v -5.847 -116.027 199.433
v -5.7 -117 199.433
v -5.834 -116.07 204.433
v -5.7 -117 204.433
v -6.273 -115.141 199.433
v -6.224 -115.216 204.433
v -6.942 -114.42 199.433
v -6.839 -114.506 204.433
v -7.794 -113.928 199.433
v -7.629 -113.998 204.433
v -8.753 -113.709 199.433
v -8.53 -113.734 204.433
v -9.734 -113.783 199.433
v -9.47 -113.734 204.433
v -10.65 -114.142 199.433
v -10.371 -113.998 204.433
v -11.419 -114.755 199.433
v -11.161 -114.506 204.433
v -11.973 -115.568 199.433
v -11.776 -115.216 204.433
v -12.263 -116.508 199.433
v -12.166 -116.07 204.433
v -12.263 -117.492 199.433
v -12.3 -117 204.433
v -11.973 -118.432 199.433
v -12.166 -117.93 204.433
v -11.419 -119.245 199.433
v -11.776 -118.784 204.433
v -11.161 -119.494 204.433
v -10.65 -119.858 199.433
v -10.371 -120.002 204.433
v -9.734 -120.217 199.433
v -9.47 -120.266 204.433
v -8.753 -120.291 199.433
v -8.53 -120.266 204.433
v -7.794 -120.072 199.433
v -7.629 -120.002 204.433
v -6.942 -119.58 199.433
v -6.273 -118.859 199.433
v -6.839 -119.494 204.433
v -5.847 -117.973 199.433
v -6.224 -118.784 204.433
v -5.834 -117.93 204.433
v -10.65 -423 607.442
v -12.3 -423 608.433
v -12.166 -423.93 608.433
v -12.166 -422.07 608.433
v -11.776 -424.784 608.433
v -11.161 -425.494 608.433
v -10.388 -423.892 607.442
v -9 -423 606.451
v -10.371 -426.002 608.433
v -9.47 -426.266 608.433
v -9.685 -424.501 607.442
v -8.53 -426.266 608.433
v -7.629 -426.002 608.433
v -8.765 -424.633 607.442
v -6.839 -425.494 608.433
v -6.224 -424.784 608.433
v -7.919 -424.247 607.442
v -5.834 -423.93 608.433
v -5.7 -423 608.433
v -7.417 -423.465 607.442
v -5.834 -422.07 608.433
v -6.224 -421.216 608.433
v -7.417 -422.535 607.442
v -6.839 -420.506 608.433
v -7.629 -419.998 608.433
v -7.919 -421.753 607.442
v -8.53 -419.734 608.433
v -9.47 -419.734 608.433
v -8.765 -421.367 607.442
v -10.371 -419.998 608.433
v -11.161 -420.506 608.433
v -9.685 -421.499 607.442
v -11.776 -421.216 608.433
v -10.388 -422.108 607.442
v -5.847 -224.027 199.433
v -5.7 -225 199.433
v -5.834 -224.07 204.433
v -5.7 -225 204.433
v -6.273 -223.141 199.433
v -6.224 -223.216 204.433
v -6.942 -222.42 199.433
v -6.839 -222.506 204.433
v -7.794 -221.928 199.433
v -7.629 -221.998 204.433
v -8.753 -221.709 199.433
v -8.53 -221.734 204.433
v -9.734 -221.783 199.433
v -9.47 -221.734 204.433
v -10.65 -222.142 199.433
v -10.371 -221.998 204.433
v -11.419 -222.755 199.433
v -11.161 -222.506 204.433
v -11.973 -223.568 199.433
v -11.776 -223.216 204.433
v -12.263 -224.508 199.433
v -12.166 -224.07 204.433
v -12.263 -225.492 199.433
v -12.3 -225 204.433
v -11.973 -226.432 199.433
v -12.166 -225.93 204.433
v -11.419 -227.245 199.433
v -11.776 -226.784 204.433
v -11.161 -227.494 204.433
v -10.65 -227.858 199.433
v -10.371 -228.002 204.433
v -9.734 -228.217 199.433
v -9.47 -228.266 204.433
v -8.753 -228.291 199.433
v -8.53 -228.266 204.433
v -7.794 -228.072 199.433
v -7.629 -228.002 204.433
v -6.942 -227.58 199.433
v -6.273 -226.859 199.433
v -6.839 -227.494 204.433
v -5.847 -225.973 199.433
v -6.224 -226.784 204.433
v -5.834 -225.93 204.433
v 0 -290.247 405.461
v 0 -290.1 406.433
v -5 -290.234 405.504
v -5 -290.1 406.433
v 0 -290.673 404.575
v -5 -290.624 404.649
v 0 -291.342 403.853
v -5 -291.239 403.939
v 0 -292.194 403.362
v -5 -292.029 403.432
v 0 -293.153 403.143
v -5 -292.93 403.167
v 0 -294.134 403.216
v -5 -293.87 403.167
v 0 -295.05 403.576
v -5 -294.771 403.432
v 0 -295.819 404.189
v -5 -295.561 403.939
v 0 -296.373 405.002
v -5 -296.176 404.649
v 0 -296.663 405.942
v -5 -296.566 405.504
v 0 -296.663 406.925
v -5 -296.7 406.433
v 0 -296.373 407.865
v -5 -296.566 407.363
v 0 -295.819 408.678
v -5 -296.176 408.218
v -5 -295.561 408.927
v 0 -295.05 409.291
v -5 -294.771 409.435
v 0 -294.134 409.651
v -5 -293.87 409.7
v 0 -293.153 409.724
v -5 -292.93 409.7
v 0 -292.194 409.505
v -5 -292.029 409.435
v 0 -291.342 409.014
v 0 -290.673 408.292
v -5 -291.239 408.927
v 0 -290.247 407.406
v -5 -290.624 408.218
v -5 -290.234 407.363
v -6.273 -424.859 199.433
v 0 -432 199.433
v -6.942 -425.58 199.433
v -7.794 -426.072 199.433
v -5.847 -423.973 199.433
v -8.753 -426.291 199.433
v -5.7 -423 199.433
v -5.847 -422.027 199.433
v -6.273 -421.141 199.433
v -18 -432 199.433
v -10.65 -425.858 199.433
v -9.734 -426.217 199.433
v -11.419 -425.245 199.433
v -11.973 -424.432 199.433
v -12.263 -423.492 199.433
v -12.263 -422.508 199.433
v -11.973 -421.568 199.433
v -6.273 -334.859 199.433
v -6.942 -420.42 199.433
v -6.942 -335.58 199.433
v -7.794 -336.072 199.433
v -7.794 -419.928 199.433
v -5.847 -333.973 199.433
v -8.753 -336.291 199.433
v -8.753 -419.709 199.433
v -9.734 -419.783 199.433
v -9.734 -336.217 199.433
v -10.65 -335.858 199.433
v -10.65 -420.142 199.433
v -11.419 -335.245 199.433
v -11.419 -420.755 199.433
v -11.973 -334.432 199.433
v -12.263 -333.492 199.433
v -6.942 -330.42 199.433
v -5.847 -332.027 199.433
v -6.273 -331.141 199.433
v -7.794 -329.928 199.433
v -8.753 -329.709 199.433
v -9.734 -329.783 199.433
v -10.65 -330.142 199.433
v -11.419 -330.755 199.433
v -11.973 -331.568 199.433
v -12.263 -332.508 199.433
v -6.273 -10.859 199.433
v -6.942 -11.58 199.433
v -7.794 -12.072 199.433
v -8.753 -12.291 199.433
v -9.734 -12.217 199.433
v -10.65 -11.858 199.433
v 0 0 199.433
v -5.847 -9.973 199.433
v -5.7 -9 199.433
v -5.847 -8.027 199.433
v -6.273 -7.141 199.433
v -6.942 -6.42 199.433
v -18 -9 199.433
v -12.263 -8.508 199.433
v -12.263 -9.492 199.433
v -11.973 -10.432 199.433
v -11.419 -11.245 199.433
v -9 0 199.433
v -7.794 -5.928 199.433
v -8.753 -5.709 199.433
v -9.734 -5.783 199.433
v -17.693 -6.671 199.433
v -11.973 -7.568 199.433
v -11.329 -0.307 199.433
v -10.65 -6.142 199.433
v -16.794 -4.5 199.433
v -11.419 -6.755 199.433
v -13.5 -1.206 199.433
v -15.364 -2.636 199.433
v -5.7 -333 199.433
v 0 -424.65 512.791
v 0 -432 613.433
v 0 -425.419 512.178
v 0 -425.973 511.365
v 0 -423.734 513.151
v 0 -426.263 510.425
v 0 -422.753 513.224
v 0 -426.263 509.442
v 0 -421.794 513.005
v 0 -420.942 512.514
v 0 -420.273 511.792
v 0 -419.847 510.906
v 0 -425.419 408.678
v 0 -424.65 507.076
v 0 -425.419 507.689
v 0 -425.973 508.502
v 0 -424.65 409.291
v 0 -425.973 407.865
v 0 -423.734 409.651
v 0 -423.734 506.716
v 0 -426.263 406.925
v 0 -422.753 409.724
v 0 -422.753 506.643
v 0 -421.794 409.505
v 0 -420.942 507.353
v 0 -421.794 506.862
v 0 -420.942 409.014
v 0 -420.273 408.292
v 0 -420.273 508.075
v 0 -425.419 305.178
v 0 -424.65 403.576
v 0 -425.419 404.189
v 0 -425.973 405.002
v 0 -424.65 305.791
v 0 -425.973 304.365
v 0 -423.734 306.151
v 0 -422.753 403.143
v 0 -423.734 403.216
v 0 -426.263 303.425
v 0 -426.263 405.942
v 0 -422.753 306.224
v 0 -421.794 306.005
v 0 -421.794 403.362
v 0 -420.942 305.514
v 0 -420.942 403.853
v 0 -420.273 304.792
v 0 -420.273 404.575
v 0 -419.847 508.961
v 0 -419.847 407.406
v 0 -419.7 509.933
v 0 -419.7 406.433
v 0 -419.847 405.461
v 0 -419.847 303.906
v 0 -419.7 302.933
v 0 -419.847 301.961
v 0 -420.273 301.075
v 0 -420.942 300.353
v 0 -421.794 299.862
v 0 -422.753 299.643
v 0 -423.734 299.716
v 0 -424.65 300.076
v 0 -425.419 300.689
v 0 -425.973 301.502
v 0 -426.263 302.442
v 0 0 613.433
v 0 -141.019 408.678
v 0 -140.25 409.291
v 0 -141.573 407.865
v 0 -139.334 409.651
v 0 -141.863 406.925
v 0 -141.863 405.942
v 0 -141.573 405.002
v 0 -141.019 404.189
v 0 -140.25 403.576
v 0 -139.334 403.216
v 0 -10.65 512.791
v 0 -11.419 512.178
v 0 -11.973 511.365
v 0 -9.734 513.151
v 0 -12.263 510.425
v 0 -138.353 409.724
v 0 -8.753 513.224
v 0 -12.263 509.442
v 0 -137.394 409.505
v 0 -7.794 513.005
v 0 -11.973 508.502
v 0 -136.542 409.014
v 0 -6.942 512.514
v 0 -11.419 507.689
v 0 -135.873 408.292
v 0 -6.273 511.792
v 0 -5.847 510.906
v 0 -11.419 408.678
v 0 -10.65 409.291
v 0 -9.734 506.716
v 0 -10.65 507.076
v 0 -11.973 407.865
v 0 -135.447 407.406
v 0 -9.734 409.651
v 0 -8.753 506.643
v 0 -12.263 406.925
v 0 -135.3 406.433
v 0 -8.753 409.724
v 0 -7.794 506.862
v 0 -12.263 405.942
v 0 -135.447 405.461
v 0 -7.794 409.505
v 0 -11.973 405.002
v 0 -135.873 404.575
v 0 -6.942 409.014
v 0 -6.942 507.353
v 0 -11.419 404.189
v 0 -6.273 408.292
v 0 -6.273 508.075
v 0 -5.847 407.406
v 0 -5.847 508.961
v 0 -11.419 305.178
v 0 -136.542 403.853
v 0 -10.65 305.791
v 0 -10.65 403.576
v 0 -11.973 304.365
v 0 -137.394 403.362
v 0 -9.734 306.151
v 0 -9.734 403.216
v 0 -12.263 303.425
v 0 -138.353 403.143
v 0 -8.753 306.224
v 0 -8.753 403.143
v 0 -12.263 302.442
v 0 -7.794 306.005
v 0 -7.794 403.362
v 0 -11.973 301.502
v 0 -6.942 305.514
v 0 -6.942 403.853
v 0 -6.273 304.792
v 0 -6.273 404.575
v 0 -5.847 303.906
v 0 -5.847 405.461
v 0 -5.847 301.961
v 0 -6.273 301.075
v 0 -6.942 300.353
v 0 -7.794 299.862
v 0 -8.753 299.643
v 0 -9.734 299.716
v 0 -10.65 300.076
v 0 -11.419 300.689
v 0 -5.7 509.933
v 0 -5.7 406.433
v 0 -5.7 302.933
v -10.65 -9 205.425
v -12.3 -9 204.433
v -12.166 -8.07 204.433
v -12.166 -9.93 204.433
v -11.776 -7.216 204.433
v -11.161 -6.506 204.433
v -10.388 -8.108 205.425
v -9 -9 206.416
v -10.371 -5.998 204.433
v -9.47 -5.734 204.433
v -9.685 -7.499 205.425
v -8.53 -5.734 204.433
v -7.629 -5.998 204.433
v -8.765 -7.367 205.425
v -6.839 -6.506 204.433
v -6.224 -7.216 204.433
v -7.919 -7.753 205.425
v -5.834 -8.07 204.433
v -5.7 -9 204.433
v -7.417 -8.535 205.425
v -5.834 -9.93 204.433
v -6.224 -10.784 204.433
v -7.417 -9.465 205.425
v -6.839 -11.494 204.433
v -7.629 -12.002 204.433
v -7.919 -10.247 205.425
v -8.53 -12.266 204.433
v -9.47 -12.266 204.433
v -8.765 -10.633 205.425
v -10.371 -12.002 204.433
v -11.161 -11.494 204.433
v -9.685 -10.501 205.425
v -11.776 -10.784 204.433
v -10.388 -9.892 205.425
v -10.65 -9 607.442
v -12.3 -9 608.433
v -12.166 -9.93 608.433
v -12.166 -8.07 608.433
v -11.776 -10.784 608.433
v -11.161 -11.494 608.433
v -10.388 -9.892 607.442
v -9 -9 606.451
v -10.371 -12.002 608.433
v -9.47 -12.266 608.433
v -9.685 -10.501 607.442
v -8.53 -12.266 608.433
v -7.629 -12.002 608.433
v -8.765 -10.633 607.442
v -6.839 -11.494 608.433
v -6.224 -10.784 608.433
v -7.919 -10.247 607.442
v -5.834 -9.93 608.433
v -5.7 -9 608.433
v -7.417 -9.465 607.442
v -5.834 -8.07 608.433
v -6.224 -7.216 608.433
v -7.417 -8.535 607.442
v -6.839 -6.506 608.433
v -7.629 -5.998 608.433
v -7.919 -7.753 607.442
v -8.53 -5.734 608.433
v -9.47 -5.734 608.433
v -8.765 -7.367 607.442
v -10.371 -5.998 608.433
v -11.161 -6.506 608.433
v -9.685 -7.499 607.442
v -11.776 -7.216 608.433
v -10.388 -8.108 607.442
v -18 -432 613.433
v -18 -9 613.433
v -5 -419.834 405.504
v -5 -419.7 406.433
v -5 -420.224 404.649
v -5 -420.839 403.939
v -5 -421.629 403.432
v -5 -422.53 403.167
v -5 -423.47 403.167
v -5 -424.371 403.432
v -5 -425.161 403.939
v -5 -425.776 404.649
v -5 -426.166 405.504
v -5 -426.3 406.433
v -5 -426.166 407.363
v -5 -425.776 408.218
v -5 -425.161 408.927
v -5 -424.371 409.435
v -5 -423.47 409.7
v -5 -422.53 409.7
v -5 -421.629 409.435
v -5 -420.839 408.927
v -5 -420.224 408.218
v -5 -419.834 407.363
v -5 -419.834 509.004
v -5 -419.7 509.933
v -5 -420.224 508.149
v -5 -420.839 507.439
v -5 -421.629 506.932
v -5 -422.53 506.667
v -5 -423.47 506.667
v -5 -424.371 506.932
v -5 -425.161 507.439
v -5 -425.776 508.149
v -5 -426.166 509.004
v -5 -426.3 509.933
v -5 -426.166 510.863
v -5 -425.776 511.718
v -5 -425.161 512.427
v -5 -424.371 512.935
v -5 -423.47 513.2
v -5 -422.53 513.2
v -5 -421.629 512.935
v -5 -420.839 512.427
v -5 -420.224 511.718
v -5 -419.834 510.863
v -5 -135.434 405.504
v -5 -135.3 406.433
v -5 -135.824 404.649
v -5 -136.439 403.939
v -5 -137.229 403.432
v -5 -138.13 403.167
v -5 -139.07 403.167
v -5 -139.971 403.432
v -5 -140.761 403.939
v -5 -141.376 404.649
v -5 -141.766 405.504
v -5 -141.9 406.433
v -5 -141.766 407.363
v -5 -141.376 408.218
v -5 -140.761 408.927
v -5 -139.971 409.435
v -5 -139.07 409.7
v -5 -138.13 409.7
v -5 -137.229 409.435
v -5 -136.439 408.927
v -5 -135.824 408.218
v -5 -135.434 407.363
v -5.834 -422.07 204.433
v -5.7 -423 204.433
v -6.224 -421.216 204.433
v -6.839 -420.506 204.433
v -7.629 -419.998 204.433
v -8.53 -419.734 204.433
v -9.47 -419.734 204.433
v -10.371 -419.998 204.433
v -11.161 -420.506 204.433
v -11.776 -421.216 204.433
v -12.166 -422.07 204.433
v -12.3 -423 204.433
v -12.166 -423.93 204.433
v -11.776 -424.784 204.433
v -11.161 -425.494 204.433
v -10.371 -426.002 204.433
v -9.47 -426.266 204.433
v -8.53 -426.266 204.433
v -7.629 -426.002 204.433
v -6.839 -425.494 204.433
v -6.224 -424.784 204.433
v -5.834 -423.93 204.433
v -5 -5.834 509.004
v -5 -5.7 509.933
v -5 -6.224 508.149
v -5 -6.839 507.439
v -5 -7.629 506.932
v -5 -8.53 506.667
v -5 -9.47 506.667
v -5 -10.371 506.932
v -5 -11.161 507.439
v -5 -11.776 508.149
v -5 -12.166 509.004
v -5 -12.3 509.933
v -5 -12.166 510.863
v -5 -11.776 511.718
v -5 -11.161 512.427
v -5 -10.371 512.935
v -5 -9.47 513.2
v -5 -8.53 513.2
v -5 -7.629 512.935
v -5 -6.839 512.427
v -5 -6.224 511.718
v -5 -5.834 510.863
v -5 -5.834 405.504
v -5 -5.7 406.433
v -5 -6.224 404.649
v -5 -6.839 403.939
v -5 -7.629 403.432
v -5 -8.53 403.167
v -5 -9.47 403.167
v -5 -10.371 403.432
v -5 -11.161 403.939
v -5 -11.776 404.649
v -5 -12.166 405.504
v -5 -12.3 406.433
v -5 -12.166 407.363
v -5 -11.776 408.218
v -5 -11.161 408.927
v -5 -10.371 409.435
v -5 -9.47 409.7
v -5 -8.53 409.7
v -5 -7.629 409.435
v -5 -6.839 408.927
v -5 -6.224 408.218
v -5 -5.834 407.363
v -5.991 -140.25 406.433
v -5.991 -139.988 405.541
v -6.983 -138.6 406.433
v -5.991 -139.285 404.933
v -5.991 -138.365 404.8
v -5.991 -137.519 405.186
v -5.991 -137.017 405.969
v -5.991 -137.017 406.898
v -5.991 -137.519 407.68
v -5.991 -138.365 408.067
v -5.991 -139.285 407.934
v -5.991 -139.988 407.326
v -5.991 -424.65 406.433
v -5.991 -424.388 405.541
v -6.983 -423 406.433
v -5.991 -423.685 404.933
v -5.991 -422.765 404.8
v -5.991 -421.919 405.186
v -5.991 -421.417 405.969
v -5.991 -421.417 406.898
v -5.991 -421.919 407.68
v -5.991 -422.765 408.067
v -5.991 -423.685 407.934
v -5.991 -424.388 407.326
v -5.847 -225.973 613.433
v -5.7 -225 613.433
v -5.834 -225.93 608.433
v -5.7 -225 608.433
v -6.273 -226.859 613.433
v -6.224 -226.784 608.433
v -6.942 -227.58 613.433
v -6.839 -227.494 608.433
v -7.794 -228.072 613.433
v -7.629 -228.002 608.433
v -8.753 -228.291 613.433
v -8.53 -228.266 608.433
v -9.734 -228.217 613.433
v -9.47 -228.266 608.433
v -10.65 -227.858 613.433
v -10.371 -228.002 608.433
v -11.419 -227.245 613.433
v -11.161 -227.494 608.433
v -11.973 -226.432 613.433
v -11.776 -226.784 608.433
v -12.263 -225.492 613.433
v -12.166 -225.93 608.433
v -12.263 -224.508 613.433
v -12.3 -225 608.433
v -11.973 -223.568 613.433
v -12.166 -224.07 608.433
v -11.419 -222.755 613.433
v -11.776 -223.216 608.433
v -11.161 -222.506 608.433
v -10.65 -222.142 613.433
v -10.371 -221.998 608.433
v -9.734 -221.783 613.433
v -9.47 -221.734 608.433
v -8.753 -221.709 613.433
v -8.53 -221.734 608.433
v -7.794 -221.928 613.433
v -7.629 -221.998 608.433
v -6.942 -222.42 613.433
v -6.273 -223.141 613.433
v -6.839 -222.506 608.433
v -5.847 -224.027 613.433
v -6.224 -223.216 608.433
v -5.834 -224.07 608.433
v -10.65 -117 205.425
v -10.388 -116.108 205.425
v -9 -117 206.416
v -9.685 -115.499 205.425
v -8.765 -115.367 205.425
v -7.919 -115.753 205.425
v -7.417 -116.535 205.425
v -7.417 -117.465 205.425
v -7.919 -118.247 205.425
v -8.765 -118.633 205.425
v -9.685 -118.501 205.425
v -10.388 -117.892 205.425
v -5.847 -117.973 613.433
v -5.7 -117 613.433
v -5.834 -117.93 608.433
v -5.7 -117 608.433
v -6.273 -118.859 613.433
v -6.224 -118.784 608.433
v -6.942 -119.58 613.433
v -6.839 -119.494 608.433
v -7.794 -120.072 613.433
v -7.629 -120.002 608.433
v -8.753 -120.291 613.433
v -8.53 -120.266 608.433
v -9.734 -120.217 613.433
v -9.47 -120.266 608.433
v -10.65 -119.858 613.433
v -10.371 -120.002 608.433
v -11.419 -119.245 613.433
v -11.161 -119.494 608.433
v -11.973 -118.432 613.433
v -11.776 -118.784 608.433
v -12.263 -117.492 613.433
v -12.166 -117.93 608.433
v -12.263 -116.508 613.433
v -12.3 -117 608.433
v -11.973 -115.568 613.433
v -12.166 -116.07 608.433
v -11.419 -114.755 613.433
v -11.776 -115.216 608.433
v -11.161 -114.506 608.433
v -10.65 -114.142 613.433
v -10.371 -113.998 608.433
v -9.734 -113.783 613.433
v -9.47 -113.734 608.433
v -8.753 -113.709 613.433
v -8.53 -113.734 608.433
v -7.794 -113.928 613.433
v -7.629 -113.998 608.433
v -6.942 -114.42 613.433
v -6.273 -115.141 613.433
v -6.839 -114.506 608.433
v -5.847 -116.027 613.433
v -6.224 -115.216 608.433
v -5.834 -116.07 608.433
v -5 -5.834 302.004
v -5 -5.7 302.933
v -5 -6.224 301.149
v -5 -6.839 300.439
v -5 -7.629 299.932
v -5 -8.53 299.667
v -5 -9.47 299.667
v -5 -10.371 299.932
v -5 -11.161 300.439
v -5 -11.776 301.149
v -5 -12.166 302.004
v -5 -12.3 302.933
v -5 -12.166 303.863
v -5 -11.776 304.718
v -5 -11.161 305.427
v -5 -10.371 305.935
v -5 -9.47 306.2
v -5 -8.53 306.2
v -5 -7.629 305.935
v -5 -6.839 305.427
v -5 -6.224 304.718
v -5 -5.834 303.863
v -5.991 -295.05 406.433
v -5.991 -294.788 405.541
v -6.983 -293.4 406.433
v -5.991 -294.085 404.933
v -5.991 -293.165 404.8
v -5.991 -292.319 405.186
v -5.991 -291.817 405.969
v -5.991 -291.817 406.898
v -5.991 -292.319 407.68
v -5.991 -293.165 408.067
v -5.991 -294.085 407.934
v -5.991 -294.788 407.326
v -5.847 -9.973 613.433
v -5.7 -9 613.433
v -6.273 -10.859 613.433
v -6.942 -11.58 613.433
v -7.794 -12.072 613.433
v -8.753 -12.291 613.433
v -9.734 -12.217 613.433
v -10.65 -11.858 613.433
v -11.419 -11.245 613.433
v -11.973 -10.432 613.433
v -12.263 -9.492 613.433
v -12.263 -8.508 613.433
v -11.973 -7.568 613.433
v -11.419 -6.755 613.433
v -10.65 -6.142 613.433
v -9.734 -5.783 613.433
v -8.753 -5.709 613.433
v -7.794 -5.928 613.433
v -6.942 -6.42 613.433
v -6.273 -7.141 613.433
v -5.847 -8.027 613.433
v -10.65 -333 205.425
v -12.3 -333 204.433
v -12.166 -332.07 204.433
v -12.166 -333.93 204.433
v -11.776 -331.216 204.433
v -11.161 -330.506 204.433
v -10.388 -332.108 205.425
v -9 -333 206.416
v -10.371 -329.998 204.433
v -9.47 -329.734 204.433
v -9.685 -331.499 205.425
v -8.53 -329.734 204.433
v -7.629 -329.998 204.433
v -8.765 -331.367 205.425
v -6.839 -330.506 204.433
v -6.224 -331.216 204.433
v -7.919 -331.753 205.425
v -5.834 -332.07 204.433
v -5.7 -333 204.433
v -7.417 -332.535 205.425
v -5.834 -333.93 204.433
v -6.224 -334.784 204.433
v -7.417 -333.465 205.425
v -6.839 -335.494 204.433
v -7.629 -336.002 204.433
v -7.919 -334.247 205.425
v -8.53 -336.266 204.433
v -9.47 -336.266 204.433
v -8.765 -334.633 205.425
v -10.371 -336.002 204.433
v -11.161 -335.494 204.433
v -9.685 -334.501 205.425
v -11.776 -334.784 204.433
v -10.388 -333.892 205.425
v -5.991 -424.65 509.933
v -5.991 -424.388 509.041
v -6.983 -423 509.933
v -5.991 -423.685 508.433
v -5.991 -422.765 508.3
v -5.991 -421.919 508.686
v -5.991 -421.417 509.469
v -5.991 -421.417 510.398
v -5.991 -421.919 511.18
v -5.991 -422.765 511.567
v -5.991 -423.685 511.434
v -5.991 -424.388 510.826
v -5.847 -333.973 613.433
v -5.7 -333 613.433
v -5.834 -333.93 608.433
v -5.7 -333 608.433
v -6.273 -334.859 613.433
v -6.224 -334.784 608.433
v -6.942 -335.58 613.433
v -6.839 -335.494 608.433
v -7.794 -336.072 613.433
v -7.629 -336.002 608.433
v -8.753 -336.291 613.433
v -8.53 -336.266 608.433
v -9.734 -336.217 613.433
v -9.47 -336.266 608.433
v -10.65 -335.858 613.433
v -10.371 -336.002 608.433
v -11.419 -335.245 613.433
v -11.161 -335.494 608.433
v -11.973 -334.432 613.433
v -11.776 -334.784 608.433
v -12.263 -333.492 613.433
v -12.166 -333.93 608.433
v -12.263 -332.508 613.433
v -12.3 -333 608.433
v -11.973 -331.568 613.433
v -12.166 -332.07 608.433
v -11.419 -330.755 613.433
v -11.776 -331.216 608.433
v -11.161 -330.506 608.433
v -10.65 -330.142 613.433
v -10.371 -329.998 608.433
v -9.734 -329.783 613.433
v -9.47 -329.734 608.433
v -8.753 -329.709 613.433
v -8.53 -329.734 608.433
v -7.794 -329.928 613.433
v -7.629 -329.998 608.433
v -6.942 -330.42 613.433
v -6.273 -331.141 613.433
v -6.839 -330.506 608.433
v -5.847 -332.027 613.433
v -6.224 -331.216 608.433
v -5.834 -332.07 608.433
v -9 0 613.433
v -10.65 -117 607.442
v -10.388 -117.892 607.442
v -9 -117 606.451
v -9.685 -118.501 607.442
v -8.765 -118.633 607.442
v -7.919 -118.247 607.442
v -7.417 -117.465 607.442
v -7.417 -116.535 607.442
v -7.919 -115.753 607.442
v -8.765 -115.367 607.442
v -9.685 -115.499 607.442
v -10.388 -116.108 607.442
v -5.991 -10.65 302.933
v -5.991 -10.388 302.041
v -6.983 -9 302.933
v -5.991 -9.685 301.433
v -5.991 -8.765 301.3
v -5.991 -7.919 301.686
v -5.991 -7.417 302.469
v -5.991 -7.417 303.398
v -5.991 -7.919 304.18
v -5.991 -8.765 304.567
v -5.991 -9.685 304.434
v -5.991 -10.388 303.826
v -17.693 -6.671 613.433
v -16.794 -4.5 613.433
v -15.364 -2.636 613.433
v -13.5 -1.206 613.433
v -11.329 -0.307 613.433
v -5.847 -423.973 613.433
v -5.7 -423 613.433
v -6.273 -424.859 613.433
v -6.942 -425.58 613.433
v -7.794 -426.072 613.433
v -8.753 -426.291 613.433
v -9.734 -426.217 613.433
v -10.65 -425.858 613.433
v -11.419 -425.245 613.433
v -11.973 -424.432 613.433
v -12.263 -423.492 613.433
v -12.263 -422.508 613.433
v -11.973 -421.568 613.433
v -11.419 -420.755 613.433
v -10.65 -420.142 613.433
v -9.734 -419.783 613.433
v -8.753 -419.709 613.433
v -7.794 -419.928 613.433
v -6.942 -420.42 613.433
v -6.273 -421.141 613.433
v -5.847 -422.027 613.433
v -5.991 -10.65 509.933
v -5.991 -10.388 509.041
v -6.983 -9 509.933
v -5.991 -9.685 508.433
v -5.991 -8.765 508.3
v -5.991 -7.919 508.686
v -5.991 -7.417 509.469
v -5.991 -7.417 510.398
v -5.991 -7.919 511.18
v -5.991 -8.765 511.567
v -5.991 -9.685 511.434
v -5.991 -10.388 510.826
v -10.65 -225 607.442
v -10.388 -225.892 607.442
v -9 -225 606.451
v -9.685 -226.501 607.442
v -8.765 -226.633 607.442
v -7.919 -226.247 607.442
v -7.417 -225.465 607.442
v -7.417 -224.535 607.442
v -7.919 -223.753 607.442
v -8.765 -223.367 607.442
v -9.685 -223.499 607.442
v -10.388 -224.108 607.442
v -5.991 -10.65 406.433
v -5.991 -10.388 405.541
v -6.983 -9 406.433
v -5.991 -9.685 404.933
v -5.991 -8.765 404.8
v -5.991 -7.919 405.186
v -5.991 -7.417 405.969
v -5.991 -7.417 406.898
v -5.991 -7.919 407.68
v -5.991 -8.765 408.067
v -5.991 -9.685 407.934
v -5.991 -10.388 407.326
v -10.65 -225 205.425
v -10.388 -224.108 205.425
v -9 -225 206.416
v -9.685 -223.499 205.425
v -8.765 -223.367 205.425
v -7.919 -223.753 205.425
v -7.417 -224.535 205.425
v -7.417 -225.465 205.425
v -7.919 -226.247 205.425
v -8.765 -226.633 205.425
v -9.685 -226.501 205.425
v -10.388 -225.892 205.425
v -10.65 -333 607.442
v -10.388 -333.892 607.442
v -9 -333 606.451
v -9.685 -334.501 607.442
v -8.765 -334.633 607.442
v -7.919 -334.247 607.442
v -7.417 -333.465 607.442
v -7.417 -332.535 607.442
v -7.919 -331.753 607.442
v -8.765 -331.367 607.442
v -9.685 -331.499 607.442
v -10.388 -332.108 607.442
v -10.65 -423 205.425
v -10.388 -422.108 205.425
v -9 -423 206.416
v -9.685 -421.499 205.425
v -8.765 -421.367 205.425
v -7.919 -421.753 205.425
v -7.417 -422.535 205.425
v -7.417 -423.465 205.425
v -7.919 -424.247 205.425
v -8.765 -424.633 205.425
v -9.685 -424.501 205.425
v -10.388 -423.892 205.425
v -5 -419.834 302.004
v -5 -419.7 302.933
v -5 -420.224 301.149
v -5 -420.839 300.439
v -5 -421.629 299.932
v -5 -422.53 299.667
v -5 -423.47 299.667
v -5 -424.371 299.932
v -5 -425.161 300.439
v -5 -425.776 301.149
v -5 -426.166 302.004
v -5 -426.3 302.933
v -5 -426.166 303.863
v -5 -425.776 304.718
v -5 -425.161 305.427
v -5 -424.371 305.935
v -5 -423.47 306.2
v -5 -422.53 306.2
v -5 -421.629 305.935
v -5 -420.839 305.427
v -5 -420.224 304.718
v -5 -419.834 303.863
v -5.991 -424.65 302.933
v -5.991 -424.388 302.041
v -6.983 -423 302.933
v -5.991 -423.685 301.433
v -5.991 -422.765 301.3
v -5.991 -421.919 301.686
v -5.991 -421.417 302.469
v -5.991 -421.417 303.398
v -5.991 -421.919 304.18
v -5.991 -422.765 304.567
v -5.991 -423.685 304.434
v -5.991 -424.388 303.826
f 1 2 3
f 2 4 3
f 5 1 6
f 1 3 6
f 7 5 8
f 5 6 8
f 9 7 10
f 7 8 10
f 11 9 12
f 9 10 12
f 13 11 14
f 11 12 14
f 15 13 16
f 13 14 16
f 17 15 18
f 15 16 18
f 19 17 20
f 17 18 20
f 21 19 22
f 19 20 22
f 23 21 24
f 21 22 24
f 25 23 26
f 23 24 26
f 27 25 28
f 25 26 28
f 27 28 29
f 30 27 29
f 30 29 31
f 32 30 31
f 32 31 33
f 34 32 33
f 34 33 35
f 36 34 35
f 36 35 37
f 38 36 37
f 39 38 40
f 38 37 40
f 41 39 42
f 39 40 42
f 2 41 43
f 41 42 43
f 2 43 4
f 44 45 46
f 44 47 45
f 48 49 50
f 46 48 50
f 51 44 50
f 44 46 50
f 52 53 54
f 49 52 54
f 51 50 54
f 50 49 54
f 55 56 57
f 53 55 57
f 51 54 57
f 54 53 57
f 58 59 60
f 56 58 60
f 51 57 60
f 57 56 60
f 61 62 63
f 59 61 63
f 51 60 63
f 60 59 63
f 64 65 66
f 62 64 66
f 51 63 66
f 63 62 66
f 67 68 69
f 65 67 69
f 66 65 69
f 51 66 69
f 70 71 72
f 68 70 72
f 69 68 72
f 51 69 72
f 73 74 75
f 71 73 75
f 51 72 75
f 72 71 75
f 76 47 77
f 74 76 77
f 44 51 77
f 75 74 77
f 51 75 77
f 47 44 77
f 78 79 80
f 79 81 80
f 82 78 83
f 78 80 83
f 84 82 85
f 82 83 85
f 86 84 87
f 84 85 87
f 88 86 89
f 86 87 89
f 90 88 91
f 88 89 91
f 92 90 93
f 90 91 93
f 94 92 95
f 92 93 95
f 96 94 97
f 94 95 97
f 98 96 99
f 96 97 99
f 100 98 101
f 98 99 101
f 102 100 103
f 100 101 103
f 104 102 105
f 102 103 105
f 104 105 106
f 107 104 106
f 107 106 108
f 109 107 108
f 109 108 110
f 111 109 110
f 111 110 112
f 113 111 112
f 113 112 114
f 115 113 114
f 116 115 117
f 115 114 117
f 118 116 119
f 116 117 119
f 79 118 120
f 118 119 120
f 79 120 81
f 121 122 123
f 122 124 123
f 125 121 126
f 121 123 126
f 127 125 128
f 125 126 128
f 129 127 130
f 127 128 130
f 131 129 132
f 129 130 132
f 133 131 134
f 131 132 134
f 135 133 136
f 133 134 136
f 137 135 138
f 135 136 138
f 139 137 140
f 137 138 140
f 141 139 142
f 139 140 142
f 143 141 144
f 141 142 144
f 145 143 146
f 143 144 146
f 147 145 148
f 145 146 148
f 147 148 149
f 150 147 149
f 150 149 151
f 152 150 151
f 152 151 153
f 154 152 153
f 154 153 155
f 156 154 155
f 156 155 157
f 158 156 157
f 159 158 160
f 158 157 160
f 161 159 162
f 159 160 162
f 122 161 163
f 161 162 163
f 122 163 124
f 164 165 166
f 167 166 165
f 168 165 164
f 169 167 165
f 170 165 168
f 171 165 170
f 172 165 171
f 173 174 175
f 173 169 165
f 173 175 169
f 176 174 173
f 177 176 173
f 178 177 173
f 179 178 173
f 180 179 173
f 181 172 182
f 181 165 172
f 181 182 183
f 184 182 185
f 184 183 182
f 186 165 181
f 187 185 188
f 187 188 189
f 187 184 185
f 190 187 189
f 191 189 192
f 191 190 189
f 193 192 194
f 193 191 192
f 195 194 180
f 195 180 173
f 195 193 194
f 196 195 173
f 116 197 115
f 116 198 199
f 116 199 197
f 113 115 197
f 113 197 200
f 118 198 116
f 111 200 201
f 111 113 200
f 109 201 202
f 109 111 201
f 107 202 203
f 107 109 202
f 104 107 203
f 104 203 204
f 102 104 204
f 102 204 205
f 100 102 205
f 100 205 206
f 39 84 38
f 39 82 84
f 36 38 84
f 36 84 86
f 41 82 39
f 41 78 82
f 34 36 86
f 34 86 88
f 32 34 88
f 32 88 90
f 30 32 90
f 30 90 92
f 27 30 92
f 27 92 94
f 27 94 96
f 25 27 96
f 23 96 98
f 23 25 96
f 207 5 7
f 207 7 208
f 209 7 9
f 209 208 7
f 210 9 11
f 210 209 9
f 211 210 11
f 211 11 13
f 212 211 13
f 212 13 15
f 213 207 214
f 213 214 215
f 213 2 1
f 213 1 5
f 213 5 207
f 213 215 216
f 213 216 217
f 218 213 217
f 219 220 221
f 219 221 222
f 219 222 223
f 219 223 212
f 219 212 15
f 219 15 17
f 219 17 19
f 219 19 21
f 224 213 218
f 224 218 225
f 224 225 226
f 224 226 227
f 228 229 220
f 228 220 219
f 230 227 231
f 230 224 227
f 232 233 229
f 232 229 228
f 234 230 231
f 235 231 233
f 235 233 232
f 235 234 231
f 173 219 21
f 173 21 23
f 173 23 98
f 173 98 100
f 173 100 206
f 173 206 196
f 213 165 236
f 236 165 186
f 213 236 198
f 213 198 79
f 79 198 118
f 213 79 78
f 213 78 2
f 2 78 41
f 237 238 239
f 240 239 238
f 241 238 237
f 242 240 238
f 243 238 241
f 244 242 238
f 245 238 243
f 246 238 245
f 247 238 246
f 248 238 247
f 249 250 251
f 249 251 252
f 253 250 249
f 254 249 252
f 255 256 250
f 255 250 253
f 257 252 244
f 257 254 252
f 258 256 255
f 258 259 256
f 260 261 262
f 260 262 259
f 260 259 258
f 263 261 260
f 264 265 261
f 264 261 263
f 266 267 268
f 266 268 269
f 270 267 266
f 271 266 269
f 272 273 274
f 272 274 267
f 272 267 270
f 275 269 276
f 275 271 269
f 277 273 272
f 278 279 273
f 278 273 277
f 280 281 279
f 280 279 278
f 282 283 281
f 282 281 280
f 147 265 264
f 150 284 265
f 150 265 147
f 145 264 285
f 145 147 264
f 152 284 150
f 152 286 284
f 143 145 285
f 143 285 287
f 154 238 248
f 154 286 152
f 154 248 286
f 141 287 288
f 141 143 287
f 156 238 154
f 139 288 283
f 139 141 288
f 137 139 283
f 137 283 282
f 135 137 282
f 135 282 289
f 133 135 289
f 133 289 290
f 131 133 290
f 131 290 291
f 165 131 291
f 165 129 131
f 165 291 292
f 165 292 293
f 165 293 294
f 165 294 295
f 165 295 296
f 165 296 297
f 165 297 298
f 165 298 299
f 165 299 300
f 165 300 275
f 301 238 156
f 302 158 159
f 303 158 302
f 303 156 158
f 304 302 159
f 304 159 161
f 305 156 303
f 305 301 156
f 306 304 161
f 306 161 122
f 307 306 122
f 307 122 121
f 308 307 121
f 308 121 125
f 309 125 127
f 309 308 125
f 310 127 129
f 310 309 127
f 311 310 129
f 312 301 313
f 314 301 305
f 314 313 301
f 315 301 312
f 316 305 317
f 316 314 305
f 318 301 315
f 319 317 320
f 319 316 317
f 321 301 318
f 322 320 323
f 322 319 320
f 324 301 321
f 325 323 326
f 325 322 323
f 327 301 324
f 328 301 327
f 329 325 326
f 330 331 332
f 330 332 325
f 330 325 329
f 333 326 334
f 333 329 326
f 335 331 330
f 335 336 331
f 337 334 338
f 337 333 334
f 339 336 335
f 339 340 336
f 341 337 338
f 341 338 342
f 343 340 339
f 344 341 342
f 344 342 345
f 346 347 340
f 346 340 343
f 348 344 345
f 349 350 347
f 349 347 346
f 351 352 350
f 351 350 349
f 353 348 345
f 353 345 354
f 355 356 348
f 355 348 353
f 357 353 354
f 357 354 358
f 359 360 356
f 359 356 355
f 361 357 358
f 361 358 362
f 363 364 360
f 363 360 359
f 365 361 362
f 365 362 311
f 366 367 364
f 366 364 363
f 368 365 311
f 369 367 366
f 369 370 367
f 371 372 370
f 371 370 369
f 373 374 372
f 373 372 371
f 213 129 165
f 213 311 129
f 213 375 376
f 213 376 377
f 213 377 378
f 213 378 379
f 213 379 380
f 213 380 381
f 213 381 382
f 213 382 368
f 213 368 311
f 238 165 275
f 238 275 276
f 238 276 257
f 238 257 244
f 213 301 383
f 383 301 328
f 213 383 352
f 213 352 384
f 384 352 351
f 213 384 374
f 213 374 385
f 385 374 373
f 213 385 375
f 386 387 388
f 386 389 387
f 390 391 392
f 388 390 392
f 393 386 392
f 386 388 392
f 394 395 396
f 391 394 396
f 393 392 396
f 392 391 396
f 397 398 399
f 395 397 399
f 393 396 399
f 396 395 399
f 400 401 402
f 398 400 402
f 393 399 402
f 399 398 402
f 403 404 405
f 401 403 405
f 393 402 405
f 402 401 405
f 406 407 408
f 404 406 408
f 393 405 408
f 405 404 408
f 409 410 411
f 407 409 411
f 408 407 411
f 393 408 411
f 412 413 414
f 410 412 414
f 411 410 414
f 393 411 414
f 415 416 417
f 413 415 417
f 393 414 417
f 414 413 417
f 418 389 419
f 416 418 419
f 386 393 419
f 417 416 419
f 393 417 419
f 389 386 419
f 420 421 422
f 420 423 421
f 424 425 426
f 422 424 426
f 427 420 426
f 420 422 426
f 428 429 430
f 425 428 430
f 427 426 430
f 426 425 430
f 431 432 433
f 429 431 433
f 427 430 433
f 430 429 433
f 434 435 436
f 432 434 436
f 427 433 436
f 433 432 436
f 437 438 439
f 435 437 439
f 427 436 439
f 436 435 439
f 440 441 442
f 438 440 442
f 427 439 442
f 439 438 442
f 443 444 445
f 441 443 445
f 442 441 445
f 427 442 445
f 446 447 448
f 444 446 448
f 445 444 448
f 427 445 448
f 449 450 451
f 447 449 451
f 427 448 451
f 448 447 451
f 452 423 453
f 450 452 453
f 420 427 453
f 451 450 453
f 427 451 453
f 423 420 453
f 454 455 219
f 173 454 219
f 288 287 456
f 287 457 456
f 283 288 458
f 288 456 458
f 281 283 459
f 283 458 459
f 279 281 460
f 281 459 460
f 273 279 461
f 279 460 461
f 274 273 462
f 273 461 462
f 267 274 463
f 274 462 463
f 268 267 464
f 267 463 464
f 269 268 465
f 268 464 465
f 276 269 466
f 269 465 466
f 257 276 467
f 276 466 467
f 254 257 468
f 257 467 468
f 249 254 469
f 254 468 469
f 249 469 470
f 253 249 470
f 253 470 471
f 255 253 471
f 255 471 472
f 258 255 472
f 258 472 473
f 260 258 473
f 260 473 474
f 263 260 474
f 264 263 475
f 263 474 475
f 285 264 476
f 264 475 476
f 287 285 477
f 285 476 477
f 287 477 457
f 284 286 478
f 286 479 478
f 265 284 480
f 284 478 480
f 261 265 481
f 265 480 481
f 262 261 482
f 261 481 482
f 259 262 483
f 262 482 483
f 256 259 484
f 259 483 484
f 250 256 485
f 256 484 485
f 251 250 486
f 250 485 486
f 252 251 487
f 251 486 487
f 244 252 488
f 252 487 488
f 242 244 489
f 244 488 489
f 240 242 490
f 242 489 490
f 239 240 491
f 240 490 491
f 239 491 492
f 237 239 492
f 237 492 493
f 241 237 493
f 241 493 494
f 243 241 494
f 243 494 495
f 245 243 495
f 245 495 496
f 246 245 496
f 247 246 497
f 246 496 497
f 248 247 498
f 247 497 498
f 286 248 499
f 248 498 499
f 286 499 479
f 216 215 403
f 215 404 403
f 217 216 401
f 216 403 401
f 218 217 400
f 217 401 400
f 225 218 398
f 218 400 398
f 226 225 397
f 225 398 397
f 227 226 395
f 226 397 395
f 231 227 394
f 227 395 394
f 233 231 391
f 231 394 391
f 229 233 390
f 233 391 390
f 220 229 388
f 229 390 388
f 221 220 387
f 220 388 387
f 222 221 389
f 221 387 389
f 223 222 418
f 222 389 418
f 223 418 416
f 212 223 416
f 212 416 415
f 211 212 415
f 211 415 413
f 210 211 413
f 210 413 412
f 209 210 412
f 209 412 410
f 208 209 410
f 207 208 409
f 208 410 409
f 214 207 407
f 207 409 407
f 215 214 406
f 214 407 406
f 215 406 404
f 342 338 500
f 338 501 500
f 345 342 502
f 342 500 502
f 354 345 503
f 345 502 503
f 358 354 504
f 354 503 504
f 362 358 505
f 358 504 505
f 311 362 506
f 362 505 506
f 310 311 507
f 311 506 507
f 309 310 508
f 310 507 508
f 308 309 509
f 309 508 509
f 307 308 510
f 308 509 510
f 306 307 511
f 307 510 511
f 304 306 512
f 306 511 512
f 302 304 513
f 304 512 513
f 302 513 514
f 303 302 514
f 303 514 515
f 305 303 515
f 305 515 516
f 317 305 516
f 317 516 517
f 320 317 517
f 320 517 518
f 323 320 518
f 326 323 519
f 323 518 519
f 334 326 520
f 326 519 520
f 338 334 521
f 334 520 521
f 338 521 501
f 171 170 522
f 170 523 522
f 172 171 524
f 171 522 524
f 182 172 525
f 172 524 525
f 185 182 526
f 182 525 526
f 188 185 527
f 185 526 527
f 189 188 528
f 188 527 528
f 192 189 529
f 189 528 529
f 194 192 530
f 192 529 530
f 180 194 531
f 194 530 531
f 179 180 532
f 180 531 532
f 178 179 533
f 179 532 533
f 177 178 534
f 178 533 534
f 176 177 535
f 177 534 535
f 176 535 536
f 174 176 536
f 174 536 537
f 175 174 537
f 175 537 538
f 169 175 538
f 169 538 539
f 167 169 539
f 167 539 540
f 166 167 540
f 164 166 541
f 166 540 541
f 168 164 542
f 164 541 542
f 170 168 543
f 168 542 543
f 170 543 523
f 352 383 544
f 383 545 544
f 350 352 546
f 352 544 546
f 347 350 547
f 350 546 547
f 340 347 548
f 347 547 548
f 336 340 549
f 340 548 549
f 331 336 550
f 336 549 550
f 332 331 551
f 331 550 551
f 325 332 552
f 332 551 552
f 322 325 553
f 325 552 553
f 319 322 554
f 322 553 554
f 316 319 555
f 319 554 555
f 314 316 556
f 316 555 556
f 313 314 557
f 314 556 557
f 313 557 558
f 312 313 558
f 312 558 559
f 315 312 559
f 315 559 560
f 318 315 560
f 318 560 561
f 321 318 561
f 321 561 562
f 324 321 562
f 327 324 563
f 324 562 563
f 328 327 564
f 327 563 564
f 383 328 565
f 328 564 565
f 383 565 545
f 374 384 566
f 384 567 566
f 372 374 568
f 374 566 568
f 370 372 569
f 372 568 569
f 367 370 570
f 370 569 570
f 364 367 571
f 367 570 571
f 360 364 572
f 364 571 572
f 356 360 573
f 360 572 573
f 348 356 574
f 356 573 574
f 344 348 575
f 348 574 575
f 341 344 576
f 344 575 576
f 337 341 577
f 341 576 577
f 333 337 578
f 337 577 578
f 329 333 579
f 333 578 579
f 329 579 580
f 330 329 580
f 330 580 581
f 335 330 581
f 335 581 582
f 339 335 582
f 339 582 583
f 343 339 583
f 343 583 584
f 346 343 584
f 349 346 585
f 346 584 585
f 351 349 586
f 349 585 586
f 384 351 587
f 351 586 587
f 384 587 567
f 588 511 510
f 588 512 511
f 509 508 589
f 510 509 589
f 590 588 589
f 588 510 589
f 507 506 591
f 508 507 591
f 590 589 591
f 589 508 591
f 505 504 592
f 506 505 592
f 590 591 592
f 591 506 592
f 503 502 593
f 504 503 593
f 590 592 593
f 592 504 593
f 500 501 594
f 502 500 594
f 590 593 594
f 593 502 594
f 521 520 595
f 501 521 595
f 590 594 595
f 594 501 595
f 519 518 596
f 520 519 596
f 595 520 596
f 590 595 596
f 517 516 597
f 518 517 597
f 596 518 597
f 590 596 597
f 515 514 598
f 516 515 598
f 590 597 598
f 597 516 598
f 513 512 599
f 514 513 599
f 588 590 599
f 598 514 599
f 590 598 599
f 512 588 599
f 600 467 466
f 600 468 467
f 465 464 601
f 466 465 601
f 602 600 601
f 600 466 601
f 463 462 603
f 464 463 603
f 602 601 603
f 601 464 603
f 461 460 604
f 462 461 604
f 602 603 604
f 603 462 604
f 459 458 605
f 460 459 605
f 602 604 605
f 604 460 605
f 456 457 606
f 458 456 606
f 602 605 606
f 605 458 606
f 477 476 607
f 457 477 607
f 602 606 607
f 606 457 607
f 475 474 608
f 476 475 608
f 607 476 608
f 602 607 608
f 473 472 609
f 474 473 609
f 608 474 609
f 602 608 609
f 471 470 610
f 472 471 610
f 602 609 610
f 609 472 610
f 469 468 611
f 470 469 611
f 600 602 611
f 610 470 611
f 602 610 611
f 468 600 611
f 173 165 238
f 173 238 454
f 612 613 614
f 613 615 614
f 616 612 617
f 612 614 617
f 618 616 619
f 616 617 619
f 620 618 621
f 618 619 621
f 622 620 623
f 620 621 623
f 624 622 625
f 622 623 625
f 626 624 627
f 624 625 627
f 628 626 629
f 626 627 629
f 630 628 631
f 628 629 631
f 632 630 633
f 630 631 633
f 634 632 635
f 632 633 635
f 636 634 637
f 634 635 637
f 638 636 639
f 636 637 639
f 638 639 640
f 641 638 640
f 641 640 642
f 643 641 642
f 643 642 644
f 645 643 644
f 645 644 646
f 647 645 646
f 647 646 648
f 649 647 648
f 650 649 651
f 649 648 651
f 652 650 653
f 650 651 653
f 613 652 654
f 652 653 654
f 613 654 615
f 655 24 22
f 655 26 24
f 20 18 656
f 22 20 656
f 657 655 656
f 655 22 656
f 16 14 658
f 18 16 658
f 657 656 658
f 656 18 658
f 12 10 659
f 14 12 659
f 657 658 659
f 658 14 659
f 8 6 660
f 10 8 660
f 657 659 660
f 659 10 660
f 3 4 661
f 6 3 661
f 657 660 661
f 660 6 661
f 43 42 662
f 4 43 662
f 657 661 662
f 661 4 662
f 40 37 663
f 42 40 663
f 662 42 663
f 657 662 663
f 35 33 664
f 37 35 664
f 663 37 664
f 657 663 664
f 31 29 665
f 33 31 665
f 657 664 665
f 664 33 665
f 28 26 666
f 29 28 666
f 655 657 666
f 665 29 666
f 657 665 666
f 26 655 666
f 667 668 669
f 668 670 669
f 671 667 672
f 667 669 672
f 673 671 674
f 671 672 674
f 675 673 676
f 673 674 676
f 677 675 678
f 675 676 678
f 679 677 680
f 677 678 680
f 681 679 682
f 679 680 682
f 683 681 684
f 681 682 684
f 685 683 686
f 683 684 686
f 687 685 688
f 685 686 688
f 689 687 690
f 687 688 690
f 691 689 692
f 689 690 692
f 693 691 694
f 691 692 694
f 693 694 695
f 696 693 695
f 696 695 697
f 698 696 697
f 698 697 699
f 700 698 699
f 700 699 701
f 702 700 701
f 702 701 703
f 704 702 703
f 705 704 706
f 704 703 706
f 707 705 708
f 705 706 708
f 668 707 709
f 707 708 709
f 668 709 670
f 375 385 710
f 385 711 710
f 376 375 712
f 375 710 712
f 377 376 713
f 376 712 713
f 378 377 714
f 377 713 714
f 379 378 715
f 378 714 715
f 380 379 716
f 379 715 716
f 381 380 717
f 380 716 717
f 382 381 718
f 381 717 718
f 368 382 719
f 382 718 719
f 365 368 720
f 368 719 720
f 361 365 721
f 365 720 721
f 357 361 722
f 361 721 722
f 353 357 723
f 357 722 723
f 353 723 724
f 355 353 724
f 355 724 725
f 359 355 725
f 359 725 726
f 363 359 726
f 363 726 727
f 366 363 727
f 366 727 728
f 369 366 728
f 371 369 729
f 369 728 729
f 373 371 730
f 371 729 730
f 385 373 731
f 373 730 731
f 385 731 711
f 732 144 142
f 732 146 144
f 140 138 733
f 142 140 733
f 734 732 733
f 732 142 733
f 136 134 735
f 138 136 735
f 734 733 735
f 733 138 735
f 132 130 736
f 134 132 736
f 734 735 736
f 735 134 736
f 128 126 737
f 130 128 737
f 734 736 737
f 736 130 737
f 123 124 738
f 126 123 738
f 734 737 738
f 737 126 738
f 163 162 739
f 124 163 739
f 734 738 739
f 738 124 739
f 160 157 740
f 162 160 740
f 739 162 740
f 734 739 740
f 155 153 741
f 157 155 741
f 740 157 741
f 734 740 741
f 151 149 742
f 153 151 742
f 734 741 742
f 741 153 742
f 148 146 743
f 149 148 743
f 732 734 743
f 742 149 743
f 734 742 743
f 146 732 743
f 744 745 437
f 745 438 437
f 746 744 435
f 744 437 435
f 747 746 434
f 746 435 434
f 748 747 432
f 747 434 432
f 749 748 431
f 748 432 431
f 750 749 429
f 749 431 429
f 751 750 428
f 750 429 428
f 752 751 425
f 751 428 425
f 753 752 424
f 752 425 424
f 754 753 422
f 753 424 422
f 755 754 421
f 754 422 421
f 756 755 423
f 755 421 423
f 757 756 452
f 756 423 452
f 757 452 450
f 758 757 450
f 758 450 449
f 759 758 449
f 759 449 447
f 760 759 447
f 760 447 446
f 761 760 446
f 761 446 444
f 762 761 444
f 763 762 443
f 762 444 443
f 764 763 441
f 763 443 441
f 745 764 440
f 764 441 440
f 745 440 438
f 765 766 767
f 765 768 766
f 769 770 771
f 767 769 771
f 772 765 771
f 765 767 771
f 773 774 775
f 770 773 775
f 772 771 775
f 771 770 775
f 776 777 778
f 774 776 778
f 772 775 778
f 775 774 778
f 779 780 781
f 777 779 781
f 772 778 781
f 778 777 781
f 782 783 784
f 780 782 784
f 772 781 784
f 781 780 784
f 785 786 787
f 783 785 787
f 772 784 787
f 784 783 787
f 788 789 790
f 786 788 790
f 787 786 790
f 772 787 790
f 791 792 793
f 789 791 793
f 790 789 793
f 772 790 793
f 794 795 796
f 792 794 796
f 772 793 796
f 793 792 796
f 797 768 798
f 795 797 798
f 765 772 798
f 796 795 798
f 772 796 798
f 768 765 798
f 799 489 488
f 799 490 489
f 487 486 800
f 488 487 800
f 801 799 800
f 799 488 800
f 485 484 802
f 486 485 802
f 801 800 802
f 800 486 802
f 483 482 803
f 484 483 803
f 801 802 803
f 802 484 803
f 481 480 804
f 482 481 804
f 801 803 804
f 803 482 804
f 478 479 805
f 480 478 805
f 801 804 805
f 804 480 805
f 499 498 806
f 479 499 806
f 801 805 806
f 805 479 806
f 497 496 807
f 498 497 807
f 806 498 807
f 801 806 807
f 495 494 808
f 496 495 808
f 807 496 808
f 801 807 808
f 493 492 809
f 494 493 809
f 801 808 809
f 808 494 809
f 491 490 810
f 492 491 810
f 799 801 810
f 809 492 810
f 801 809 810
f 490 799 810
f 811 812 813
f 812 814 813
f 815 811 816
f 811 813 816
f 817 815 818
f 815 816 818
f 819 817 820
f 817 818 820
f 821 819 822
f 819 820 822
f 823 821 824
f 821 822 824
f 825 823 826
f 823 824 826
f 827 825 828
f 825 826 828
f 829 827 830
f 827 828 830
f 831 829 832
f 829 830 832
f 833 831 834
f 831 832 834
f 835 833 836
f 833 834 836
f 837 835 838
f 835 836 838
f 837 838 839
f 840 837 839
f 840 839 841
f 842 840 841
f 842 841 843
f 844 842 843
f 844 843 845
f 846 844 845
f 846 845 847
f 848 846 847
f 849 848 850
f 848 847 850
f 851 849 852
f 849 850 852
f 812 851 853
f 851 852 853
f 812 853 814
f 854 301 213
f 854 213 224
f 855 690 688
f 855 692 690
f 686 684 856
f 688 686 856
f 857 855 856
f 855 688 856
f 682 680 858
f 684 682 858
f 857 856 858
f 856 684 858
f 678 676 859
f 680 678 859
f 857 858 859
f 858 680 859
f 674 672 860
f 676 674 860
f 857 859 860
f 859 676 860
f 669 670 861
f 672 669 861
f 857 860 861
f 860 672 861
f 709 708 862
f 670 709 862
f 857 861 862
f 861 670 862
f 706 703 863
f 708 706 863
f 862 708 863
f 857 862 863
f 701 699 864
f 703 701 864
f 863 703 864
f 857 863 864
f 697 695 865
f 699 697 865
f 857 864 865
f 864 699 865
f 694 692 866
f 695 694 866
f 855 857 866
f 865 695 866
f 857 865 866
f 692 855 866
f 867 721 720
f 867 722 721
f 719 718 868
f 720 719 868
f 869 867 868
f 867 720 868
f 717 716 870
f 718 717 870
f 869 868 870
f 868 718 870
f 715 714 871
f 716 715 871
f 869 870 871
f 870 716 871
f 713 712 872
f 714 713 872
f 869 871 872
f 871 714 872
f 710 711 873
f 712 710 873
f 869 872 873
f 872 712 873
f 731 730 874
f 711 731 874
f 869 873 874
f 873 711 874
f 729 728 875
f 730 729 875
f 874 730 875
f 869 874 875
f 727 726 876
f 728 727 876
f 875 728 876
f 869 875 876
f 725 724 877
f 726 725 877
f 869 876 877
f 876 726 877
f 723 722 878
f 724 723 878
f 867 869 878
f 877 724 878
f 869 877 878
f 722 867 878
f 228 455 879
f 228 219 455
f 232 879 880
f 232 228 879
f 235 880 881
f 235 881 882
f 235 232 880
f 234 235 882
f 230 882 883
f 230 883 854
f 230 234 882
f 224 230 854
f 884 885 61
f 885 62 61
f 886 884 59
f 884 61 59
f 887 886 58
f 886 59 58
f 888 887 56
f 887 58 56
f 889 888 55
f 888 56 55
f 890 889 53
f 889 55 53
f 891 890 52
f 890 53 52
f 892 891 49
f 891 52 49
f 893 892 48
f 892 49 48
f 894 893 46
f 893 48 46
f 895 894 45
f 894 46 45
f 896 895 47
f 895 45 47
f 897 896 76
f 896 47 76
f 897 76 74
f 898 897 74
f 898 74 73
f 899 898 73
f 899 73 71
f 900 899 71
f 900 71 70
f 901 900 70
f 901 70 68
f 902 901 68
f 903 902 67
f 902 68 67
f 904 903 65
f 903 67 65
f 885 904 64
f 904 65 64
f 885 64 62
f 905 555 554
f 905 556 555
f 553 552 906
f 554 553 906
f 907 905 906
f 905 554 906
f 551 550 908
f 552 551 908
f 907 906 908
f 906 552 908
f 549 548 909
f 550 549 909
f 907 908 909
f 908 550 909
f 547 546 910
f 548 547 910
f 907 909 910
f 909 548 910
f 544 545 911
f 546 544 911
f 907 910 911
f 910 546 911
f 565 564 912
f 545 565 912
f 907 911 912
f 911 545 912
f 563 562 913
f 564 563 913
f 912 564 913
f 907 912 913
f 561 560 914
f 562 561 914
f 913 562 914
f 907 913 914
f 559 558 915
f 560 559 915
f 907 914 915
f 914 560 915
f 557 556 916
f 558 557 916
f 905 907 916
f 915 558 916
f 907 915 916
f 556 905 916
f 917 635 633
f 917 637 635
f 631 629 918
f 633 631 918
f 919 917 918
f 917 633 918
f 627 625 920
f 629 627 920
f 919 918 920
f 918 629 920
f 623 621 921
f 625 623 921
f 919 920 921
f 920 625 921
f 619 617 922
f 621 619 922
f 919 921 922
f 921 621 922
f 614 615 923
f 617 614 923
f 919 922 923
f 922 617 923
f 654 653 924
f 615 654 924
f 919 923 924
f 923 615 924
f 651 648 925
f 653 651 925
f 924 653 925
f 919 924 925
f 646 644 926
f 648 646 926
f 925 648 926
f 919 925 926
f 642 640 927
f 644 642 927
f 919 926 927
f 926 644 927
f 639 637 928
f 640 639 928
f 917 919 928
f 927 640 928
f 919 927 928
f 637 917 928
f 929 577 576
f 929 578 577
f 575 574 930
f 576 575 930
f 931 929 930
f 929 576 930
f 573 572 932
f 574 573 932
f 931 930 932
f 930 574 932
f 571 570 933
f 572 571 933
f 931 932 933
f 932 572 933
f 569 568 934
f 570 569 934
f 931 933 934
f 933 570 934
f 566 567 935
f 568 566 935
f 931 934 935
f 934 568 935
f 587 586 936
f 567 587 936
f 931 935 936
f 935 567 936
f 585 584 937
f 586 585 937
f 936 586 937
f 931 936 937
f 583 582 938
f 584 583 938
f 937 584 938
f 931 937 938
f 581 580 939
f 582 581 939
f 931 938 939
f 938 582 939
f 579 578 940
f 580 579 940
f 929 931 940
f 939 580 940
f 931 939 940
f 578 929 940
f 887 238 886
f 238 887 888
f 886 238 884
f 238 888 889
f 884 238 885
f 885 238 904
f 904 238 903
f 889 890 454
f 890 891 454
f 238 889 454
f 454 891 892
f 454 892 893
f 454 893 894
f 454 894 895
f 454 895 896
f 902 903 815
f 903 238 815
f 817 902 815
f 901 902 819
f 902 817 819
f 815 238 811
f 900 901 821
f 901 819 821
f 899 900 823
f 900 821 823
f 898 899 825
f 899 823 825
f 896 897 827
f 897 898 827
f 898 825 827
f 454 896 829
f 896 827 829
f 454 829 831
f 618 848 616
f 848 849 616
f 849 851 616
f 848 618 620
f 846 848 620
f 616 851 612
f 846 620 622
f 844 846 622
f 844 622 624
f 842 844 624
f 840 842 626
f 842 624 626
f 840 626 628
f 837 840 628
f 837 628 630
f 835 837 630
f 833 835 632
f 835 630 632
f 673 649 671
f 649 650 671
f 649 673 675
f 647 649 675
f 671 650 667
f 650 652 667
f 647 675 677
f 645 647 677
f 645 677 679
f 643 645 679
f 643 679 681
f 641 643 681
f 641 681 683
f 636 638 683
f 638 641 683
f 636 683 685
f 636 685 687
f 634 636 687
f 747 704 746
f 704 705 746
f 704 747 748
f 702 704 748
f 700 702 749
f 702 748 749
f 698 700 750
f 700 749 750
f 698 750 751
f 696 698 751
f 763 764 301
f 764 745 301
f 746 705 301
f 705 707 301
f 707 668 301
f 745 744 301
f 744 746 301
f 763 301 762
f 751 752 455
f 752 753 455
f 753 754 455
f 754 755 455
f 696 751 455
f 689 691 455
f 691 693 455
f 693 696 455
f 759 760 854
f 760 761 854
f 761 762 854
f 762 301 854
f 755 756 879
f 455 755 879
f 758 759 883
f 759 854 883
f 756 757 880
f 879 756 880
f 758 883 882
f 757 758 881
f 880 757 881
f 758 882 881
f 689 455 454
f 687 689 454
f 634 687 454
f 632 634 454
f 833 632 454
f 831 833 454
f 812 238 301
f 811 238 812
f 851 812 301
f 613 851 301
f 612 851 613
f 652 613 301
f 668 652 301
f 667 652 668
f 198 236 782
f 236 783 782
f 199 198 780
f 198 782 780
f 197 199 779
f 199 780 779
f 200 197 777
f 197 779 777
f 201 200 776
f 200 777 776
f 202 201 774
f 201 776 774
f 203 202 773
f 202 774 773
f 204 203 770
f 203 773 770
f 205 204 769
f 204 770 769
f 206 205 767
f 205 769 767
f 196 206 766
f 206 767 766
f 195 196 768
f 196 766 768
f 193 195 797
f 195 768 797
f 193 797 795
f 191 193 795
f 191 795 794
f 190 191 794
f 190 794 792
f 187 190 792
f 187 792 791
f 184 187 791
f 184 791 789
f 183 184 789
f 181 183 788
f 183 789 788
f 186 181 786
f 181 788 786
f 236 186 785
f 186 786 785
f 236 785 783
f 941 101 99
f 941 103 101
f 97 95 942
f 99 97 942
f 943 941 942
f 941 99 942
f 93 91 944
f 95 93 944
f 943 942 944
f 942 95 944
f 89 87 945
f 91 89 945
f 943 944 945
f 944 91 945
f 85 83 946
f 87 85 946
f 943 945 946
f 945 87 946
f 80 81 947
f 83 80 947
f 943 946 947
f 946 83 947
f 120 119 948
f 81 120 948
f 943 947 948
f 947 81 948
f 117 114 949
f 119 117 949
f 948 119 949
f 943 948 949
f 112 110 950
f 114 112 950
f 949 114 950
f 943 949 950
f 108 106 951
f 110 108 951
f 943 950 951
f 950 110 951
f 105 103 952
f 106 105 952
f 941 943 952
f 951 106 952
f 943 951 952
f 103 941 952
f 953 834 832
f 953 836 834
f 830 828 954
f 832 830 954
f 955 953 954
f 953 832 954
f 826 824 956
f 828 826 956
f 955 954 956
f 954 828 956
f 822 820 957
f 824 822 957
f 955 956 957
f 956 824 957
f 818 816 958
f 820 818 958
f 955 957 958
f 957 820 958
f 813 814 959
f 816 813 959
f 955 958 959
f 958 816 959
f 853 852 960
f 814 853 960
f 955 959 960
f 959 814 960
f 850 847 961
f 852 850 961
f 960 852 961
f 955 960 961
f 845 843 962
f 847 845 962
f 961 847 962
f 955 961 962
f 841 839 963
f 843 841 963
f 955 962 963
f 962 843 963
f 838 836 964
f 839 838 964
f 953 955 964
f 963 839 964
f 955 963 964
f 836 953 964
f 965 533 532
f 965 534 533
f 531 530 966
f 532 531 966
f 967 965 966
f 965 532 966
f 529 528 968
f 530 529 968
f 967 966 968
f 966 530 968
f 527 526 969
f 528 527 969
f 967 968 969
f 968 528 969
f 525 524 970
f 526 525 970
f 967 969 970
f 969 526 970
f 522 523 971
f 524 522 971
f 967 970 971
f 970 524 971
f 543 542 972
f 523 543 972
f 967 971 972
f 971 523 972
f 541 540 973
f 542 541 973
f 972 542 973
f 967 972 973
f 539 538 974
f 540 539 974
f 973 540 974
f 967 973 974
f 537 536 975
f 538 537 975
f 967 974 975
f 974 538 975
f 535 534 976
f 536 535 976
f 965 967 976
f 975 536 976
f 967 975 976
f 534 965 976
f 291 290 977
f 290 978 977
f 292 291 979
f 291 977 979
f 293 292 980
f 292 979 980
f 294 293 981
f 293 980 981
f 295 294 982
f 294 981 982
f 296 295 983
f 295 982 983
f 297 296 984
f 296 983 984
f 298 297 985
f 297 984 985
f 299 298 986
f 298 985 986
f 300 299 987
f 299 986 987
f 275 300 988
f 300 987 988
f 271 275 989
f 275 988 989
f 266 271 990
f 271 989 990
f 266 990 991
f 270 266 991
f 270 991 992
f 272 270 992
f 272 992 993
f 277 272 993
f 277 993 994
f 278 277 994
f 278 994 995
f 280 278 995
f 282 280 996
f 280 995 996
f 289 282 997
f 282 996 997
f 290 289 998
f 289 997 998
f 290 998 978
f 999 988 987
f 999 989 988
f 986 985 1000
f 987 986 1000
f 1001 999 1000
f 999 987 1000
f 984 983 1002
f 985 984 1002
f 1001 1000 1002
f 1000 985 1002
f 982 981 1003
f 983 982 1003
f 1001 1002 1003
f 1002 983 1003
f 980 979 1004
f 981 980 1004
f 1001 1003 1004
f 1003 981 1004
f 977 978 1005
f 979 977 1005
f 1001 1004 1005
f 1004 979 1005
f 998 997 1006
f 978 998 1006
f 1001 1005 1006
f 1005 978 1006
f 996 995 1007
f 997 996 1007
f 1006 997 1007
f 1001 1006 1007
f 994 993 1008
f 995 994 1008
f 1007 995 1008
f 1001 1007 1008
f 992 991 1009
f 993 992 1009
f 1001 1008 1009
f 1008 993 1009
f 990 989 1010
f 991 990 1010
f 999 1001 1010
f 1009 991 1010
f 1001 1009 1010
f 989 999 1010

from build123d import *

# Parameters (mm, degrees)
F0_W           = 18
F0_H           = 414
F1_DEPTH       = 432
F2_R           = 9
F6_D           = 6.6
F6_DEPTH       = 5
F6_TIP         = 1.9828400428
F6_ON_F3_D     = 6.6
F6_ON_F3_DEPTH = 5
F6_ON_F3_TIP   = 1.9828400428
F6_ON_F5_D     = 6.6
F6_ON_F5_DEPTH = 5
F6_ON_F5_TIP   = 1.9828400428
F7_ANGLE       = 180


# Not quite as in the source:
# - a feature names something its author has since deleted; it is built from what else it names


with BuildPart() as f1:
    # F0 (on Front) → F1 (new body)
    with BuildSketch(Plane.XZ):
        with Locations((9, -7.566531274)):
            Rectangle(F0_W, F0_H)
    extrude(amount=F1_DEPTH)

    # F2
    f2_edges = [f1.edges().sort_by_distance(p)[0] for p in [
        (18, 0, -7.566531),
    ]]
    fillet(f2_edges, radius=F2_R)

    # F6
    with Locations(Plane(origin=(0, 0, -214.566531274), x_dir=(1, 0, 0), z_dir=(0, 0, -1))):
        with Locations((9, 9), (9, 117), (9, 225), (9, 333), (9, 423)):
            Hole(F6_D / 2, depth=F6_DEPTH)
            with Locations((0, 0, -(F6_DEPTH + F6_TIP / 2))):  # 118° drill point
                Cone(0, F6_D / 2, F6_TIP, mode=Mode.SUBTRACT)

    # F6 on F3
    with Locations(Plane(origin=(0, 0, 0), x_dir=(0, -1, 0), z_dir=(-1, 0, 0))):
        with Locations((423, -111.066531274), (423, -7.566531274), (423, 95.933468726), (9, -111.066531274), (9, -7.566531274), (9, 95.933468726), (138.6, -7.566531274), (293.4, -7.566531274)):
            Hole(F6_ON_F3_D / 2, depth=F6_ON_F3_DEPTH)
            with Locations((0, 0, -(F6_ON_F3_DEPTH + F6_ON_F3_TIP / 2))):  # 118° drill point
                Cone(0, F6_ON_F3_D / 2, F6_ON_F3_TIP, mode=Mode.SUBTRACT)

    # F6 on F5
    with Locations(Plane.XY.offset(199.433468726)):
        with Locations((9, -117), (9, -225), (9, -333), (9, -9), (9, -423)):
            Hole(F6_ON_F5_D / 2, depth=F6_ON_F5_DEPTH)
            with Locations((0, 0, -(F6_ON_F5_DEPTH + F6_ON_F5_TIP / 2))):  # 118° drill point
                Cone(0, F6_ON_F5_D / 2, F6_ON_F5_TIP, mode=Mode.SUBTRACT)


with BuildPart() as f1_1:
    # F7: moved
    add(f1.part.rotate(Axis((0, -216, 199.433468726), (0, 1, 0)), F7_ANGLE))


solid = f1_1.part
